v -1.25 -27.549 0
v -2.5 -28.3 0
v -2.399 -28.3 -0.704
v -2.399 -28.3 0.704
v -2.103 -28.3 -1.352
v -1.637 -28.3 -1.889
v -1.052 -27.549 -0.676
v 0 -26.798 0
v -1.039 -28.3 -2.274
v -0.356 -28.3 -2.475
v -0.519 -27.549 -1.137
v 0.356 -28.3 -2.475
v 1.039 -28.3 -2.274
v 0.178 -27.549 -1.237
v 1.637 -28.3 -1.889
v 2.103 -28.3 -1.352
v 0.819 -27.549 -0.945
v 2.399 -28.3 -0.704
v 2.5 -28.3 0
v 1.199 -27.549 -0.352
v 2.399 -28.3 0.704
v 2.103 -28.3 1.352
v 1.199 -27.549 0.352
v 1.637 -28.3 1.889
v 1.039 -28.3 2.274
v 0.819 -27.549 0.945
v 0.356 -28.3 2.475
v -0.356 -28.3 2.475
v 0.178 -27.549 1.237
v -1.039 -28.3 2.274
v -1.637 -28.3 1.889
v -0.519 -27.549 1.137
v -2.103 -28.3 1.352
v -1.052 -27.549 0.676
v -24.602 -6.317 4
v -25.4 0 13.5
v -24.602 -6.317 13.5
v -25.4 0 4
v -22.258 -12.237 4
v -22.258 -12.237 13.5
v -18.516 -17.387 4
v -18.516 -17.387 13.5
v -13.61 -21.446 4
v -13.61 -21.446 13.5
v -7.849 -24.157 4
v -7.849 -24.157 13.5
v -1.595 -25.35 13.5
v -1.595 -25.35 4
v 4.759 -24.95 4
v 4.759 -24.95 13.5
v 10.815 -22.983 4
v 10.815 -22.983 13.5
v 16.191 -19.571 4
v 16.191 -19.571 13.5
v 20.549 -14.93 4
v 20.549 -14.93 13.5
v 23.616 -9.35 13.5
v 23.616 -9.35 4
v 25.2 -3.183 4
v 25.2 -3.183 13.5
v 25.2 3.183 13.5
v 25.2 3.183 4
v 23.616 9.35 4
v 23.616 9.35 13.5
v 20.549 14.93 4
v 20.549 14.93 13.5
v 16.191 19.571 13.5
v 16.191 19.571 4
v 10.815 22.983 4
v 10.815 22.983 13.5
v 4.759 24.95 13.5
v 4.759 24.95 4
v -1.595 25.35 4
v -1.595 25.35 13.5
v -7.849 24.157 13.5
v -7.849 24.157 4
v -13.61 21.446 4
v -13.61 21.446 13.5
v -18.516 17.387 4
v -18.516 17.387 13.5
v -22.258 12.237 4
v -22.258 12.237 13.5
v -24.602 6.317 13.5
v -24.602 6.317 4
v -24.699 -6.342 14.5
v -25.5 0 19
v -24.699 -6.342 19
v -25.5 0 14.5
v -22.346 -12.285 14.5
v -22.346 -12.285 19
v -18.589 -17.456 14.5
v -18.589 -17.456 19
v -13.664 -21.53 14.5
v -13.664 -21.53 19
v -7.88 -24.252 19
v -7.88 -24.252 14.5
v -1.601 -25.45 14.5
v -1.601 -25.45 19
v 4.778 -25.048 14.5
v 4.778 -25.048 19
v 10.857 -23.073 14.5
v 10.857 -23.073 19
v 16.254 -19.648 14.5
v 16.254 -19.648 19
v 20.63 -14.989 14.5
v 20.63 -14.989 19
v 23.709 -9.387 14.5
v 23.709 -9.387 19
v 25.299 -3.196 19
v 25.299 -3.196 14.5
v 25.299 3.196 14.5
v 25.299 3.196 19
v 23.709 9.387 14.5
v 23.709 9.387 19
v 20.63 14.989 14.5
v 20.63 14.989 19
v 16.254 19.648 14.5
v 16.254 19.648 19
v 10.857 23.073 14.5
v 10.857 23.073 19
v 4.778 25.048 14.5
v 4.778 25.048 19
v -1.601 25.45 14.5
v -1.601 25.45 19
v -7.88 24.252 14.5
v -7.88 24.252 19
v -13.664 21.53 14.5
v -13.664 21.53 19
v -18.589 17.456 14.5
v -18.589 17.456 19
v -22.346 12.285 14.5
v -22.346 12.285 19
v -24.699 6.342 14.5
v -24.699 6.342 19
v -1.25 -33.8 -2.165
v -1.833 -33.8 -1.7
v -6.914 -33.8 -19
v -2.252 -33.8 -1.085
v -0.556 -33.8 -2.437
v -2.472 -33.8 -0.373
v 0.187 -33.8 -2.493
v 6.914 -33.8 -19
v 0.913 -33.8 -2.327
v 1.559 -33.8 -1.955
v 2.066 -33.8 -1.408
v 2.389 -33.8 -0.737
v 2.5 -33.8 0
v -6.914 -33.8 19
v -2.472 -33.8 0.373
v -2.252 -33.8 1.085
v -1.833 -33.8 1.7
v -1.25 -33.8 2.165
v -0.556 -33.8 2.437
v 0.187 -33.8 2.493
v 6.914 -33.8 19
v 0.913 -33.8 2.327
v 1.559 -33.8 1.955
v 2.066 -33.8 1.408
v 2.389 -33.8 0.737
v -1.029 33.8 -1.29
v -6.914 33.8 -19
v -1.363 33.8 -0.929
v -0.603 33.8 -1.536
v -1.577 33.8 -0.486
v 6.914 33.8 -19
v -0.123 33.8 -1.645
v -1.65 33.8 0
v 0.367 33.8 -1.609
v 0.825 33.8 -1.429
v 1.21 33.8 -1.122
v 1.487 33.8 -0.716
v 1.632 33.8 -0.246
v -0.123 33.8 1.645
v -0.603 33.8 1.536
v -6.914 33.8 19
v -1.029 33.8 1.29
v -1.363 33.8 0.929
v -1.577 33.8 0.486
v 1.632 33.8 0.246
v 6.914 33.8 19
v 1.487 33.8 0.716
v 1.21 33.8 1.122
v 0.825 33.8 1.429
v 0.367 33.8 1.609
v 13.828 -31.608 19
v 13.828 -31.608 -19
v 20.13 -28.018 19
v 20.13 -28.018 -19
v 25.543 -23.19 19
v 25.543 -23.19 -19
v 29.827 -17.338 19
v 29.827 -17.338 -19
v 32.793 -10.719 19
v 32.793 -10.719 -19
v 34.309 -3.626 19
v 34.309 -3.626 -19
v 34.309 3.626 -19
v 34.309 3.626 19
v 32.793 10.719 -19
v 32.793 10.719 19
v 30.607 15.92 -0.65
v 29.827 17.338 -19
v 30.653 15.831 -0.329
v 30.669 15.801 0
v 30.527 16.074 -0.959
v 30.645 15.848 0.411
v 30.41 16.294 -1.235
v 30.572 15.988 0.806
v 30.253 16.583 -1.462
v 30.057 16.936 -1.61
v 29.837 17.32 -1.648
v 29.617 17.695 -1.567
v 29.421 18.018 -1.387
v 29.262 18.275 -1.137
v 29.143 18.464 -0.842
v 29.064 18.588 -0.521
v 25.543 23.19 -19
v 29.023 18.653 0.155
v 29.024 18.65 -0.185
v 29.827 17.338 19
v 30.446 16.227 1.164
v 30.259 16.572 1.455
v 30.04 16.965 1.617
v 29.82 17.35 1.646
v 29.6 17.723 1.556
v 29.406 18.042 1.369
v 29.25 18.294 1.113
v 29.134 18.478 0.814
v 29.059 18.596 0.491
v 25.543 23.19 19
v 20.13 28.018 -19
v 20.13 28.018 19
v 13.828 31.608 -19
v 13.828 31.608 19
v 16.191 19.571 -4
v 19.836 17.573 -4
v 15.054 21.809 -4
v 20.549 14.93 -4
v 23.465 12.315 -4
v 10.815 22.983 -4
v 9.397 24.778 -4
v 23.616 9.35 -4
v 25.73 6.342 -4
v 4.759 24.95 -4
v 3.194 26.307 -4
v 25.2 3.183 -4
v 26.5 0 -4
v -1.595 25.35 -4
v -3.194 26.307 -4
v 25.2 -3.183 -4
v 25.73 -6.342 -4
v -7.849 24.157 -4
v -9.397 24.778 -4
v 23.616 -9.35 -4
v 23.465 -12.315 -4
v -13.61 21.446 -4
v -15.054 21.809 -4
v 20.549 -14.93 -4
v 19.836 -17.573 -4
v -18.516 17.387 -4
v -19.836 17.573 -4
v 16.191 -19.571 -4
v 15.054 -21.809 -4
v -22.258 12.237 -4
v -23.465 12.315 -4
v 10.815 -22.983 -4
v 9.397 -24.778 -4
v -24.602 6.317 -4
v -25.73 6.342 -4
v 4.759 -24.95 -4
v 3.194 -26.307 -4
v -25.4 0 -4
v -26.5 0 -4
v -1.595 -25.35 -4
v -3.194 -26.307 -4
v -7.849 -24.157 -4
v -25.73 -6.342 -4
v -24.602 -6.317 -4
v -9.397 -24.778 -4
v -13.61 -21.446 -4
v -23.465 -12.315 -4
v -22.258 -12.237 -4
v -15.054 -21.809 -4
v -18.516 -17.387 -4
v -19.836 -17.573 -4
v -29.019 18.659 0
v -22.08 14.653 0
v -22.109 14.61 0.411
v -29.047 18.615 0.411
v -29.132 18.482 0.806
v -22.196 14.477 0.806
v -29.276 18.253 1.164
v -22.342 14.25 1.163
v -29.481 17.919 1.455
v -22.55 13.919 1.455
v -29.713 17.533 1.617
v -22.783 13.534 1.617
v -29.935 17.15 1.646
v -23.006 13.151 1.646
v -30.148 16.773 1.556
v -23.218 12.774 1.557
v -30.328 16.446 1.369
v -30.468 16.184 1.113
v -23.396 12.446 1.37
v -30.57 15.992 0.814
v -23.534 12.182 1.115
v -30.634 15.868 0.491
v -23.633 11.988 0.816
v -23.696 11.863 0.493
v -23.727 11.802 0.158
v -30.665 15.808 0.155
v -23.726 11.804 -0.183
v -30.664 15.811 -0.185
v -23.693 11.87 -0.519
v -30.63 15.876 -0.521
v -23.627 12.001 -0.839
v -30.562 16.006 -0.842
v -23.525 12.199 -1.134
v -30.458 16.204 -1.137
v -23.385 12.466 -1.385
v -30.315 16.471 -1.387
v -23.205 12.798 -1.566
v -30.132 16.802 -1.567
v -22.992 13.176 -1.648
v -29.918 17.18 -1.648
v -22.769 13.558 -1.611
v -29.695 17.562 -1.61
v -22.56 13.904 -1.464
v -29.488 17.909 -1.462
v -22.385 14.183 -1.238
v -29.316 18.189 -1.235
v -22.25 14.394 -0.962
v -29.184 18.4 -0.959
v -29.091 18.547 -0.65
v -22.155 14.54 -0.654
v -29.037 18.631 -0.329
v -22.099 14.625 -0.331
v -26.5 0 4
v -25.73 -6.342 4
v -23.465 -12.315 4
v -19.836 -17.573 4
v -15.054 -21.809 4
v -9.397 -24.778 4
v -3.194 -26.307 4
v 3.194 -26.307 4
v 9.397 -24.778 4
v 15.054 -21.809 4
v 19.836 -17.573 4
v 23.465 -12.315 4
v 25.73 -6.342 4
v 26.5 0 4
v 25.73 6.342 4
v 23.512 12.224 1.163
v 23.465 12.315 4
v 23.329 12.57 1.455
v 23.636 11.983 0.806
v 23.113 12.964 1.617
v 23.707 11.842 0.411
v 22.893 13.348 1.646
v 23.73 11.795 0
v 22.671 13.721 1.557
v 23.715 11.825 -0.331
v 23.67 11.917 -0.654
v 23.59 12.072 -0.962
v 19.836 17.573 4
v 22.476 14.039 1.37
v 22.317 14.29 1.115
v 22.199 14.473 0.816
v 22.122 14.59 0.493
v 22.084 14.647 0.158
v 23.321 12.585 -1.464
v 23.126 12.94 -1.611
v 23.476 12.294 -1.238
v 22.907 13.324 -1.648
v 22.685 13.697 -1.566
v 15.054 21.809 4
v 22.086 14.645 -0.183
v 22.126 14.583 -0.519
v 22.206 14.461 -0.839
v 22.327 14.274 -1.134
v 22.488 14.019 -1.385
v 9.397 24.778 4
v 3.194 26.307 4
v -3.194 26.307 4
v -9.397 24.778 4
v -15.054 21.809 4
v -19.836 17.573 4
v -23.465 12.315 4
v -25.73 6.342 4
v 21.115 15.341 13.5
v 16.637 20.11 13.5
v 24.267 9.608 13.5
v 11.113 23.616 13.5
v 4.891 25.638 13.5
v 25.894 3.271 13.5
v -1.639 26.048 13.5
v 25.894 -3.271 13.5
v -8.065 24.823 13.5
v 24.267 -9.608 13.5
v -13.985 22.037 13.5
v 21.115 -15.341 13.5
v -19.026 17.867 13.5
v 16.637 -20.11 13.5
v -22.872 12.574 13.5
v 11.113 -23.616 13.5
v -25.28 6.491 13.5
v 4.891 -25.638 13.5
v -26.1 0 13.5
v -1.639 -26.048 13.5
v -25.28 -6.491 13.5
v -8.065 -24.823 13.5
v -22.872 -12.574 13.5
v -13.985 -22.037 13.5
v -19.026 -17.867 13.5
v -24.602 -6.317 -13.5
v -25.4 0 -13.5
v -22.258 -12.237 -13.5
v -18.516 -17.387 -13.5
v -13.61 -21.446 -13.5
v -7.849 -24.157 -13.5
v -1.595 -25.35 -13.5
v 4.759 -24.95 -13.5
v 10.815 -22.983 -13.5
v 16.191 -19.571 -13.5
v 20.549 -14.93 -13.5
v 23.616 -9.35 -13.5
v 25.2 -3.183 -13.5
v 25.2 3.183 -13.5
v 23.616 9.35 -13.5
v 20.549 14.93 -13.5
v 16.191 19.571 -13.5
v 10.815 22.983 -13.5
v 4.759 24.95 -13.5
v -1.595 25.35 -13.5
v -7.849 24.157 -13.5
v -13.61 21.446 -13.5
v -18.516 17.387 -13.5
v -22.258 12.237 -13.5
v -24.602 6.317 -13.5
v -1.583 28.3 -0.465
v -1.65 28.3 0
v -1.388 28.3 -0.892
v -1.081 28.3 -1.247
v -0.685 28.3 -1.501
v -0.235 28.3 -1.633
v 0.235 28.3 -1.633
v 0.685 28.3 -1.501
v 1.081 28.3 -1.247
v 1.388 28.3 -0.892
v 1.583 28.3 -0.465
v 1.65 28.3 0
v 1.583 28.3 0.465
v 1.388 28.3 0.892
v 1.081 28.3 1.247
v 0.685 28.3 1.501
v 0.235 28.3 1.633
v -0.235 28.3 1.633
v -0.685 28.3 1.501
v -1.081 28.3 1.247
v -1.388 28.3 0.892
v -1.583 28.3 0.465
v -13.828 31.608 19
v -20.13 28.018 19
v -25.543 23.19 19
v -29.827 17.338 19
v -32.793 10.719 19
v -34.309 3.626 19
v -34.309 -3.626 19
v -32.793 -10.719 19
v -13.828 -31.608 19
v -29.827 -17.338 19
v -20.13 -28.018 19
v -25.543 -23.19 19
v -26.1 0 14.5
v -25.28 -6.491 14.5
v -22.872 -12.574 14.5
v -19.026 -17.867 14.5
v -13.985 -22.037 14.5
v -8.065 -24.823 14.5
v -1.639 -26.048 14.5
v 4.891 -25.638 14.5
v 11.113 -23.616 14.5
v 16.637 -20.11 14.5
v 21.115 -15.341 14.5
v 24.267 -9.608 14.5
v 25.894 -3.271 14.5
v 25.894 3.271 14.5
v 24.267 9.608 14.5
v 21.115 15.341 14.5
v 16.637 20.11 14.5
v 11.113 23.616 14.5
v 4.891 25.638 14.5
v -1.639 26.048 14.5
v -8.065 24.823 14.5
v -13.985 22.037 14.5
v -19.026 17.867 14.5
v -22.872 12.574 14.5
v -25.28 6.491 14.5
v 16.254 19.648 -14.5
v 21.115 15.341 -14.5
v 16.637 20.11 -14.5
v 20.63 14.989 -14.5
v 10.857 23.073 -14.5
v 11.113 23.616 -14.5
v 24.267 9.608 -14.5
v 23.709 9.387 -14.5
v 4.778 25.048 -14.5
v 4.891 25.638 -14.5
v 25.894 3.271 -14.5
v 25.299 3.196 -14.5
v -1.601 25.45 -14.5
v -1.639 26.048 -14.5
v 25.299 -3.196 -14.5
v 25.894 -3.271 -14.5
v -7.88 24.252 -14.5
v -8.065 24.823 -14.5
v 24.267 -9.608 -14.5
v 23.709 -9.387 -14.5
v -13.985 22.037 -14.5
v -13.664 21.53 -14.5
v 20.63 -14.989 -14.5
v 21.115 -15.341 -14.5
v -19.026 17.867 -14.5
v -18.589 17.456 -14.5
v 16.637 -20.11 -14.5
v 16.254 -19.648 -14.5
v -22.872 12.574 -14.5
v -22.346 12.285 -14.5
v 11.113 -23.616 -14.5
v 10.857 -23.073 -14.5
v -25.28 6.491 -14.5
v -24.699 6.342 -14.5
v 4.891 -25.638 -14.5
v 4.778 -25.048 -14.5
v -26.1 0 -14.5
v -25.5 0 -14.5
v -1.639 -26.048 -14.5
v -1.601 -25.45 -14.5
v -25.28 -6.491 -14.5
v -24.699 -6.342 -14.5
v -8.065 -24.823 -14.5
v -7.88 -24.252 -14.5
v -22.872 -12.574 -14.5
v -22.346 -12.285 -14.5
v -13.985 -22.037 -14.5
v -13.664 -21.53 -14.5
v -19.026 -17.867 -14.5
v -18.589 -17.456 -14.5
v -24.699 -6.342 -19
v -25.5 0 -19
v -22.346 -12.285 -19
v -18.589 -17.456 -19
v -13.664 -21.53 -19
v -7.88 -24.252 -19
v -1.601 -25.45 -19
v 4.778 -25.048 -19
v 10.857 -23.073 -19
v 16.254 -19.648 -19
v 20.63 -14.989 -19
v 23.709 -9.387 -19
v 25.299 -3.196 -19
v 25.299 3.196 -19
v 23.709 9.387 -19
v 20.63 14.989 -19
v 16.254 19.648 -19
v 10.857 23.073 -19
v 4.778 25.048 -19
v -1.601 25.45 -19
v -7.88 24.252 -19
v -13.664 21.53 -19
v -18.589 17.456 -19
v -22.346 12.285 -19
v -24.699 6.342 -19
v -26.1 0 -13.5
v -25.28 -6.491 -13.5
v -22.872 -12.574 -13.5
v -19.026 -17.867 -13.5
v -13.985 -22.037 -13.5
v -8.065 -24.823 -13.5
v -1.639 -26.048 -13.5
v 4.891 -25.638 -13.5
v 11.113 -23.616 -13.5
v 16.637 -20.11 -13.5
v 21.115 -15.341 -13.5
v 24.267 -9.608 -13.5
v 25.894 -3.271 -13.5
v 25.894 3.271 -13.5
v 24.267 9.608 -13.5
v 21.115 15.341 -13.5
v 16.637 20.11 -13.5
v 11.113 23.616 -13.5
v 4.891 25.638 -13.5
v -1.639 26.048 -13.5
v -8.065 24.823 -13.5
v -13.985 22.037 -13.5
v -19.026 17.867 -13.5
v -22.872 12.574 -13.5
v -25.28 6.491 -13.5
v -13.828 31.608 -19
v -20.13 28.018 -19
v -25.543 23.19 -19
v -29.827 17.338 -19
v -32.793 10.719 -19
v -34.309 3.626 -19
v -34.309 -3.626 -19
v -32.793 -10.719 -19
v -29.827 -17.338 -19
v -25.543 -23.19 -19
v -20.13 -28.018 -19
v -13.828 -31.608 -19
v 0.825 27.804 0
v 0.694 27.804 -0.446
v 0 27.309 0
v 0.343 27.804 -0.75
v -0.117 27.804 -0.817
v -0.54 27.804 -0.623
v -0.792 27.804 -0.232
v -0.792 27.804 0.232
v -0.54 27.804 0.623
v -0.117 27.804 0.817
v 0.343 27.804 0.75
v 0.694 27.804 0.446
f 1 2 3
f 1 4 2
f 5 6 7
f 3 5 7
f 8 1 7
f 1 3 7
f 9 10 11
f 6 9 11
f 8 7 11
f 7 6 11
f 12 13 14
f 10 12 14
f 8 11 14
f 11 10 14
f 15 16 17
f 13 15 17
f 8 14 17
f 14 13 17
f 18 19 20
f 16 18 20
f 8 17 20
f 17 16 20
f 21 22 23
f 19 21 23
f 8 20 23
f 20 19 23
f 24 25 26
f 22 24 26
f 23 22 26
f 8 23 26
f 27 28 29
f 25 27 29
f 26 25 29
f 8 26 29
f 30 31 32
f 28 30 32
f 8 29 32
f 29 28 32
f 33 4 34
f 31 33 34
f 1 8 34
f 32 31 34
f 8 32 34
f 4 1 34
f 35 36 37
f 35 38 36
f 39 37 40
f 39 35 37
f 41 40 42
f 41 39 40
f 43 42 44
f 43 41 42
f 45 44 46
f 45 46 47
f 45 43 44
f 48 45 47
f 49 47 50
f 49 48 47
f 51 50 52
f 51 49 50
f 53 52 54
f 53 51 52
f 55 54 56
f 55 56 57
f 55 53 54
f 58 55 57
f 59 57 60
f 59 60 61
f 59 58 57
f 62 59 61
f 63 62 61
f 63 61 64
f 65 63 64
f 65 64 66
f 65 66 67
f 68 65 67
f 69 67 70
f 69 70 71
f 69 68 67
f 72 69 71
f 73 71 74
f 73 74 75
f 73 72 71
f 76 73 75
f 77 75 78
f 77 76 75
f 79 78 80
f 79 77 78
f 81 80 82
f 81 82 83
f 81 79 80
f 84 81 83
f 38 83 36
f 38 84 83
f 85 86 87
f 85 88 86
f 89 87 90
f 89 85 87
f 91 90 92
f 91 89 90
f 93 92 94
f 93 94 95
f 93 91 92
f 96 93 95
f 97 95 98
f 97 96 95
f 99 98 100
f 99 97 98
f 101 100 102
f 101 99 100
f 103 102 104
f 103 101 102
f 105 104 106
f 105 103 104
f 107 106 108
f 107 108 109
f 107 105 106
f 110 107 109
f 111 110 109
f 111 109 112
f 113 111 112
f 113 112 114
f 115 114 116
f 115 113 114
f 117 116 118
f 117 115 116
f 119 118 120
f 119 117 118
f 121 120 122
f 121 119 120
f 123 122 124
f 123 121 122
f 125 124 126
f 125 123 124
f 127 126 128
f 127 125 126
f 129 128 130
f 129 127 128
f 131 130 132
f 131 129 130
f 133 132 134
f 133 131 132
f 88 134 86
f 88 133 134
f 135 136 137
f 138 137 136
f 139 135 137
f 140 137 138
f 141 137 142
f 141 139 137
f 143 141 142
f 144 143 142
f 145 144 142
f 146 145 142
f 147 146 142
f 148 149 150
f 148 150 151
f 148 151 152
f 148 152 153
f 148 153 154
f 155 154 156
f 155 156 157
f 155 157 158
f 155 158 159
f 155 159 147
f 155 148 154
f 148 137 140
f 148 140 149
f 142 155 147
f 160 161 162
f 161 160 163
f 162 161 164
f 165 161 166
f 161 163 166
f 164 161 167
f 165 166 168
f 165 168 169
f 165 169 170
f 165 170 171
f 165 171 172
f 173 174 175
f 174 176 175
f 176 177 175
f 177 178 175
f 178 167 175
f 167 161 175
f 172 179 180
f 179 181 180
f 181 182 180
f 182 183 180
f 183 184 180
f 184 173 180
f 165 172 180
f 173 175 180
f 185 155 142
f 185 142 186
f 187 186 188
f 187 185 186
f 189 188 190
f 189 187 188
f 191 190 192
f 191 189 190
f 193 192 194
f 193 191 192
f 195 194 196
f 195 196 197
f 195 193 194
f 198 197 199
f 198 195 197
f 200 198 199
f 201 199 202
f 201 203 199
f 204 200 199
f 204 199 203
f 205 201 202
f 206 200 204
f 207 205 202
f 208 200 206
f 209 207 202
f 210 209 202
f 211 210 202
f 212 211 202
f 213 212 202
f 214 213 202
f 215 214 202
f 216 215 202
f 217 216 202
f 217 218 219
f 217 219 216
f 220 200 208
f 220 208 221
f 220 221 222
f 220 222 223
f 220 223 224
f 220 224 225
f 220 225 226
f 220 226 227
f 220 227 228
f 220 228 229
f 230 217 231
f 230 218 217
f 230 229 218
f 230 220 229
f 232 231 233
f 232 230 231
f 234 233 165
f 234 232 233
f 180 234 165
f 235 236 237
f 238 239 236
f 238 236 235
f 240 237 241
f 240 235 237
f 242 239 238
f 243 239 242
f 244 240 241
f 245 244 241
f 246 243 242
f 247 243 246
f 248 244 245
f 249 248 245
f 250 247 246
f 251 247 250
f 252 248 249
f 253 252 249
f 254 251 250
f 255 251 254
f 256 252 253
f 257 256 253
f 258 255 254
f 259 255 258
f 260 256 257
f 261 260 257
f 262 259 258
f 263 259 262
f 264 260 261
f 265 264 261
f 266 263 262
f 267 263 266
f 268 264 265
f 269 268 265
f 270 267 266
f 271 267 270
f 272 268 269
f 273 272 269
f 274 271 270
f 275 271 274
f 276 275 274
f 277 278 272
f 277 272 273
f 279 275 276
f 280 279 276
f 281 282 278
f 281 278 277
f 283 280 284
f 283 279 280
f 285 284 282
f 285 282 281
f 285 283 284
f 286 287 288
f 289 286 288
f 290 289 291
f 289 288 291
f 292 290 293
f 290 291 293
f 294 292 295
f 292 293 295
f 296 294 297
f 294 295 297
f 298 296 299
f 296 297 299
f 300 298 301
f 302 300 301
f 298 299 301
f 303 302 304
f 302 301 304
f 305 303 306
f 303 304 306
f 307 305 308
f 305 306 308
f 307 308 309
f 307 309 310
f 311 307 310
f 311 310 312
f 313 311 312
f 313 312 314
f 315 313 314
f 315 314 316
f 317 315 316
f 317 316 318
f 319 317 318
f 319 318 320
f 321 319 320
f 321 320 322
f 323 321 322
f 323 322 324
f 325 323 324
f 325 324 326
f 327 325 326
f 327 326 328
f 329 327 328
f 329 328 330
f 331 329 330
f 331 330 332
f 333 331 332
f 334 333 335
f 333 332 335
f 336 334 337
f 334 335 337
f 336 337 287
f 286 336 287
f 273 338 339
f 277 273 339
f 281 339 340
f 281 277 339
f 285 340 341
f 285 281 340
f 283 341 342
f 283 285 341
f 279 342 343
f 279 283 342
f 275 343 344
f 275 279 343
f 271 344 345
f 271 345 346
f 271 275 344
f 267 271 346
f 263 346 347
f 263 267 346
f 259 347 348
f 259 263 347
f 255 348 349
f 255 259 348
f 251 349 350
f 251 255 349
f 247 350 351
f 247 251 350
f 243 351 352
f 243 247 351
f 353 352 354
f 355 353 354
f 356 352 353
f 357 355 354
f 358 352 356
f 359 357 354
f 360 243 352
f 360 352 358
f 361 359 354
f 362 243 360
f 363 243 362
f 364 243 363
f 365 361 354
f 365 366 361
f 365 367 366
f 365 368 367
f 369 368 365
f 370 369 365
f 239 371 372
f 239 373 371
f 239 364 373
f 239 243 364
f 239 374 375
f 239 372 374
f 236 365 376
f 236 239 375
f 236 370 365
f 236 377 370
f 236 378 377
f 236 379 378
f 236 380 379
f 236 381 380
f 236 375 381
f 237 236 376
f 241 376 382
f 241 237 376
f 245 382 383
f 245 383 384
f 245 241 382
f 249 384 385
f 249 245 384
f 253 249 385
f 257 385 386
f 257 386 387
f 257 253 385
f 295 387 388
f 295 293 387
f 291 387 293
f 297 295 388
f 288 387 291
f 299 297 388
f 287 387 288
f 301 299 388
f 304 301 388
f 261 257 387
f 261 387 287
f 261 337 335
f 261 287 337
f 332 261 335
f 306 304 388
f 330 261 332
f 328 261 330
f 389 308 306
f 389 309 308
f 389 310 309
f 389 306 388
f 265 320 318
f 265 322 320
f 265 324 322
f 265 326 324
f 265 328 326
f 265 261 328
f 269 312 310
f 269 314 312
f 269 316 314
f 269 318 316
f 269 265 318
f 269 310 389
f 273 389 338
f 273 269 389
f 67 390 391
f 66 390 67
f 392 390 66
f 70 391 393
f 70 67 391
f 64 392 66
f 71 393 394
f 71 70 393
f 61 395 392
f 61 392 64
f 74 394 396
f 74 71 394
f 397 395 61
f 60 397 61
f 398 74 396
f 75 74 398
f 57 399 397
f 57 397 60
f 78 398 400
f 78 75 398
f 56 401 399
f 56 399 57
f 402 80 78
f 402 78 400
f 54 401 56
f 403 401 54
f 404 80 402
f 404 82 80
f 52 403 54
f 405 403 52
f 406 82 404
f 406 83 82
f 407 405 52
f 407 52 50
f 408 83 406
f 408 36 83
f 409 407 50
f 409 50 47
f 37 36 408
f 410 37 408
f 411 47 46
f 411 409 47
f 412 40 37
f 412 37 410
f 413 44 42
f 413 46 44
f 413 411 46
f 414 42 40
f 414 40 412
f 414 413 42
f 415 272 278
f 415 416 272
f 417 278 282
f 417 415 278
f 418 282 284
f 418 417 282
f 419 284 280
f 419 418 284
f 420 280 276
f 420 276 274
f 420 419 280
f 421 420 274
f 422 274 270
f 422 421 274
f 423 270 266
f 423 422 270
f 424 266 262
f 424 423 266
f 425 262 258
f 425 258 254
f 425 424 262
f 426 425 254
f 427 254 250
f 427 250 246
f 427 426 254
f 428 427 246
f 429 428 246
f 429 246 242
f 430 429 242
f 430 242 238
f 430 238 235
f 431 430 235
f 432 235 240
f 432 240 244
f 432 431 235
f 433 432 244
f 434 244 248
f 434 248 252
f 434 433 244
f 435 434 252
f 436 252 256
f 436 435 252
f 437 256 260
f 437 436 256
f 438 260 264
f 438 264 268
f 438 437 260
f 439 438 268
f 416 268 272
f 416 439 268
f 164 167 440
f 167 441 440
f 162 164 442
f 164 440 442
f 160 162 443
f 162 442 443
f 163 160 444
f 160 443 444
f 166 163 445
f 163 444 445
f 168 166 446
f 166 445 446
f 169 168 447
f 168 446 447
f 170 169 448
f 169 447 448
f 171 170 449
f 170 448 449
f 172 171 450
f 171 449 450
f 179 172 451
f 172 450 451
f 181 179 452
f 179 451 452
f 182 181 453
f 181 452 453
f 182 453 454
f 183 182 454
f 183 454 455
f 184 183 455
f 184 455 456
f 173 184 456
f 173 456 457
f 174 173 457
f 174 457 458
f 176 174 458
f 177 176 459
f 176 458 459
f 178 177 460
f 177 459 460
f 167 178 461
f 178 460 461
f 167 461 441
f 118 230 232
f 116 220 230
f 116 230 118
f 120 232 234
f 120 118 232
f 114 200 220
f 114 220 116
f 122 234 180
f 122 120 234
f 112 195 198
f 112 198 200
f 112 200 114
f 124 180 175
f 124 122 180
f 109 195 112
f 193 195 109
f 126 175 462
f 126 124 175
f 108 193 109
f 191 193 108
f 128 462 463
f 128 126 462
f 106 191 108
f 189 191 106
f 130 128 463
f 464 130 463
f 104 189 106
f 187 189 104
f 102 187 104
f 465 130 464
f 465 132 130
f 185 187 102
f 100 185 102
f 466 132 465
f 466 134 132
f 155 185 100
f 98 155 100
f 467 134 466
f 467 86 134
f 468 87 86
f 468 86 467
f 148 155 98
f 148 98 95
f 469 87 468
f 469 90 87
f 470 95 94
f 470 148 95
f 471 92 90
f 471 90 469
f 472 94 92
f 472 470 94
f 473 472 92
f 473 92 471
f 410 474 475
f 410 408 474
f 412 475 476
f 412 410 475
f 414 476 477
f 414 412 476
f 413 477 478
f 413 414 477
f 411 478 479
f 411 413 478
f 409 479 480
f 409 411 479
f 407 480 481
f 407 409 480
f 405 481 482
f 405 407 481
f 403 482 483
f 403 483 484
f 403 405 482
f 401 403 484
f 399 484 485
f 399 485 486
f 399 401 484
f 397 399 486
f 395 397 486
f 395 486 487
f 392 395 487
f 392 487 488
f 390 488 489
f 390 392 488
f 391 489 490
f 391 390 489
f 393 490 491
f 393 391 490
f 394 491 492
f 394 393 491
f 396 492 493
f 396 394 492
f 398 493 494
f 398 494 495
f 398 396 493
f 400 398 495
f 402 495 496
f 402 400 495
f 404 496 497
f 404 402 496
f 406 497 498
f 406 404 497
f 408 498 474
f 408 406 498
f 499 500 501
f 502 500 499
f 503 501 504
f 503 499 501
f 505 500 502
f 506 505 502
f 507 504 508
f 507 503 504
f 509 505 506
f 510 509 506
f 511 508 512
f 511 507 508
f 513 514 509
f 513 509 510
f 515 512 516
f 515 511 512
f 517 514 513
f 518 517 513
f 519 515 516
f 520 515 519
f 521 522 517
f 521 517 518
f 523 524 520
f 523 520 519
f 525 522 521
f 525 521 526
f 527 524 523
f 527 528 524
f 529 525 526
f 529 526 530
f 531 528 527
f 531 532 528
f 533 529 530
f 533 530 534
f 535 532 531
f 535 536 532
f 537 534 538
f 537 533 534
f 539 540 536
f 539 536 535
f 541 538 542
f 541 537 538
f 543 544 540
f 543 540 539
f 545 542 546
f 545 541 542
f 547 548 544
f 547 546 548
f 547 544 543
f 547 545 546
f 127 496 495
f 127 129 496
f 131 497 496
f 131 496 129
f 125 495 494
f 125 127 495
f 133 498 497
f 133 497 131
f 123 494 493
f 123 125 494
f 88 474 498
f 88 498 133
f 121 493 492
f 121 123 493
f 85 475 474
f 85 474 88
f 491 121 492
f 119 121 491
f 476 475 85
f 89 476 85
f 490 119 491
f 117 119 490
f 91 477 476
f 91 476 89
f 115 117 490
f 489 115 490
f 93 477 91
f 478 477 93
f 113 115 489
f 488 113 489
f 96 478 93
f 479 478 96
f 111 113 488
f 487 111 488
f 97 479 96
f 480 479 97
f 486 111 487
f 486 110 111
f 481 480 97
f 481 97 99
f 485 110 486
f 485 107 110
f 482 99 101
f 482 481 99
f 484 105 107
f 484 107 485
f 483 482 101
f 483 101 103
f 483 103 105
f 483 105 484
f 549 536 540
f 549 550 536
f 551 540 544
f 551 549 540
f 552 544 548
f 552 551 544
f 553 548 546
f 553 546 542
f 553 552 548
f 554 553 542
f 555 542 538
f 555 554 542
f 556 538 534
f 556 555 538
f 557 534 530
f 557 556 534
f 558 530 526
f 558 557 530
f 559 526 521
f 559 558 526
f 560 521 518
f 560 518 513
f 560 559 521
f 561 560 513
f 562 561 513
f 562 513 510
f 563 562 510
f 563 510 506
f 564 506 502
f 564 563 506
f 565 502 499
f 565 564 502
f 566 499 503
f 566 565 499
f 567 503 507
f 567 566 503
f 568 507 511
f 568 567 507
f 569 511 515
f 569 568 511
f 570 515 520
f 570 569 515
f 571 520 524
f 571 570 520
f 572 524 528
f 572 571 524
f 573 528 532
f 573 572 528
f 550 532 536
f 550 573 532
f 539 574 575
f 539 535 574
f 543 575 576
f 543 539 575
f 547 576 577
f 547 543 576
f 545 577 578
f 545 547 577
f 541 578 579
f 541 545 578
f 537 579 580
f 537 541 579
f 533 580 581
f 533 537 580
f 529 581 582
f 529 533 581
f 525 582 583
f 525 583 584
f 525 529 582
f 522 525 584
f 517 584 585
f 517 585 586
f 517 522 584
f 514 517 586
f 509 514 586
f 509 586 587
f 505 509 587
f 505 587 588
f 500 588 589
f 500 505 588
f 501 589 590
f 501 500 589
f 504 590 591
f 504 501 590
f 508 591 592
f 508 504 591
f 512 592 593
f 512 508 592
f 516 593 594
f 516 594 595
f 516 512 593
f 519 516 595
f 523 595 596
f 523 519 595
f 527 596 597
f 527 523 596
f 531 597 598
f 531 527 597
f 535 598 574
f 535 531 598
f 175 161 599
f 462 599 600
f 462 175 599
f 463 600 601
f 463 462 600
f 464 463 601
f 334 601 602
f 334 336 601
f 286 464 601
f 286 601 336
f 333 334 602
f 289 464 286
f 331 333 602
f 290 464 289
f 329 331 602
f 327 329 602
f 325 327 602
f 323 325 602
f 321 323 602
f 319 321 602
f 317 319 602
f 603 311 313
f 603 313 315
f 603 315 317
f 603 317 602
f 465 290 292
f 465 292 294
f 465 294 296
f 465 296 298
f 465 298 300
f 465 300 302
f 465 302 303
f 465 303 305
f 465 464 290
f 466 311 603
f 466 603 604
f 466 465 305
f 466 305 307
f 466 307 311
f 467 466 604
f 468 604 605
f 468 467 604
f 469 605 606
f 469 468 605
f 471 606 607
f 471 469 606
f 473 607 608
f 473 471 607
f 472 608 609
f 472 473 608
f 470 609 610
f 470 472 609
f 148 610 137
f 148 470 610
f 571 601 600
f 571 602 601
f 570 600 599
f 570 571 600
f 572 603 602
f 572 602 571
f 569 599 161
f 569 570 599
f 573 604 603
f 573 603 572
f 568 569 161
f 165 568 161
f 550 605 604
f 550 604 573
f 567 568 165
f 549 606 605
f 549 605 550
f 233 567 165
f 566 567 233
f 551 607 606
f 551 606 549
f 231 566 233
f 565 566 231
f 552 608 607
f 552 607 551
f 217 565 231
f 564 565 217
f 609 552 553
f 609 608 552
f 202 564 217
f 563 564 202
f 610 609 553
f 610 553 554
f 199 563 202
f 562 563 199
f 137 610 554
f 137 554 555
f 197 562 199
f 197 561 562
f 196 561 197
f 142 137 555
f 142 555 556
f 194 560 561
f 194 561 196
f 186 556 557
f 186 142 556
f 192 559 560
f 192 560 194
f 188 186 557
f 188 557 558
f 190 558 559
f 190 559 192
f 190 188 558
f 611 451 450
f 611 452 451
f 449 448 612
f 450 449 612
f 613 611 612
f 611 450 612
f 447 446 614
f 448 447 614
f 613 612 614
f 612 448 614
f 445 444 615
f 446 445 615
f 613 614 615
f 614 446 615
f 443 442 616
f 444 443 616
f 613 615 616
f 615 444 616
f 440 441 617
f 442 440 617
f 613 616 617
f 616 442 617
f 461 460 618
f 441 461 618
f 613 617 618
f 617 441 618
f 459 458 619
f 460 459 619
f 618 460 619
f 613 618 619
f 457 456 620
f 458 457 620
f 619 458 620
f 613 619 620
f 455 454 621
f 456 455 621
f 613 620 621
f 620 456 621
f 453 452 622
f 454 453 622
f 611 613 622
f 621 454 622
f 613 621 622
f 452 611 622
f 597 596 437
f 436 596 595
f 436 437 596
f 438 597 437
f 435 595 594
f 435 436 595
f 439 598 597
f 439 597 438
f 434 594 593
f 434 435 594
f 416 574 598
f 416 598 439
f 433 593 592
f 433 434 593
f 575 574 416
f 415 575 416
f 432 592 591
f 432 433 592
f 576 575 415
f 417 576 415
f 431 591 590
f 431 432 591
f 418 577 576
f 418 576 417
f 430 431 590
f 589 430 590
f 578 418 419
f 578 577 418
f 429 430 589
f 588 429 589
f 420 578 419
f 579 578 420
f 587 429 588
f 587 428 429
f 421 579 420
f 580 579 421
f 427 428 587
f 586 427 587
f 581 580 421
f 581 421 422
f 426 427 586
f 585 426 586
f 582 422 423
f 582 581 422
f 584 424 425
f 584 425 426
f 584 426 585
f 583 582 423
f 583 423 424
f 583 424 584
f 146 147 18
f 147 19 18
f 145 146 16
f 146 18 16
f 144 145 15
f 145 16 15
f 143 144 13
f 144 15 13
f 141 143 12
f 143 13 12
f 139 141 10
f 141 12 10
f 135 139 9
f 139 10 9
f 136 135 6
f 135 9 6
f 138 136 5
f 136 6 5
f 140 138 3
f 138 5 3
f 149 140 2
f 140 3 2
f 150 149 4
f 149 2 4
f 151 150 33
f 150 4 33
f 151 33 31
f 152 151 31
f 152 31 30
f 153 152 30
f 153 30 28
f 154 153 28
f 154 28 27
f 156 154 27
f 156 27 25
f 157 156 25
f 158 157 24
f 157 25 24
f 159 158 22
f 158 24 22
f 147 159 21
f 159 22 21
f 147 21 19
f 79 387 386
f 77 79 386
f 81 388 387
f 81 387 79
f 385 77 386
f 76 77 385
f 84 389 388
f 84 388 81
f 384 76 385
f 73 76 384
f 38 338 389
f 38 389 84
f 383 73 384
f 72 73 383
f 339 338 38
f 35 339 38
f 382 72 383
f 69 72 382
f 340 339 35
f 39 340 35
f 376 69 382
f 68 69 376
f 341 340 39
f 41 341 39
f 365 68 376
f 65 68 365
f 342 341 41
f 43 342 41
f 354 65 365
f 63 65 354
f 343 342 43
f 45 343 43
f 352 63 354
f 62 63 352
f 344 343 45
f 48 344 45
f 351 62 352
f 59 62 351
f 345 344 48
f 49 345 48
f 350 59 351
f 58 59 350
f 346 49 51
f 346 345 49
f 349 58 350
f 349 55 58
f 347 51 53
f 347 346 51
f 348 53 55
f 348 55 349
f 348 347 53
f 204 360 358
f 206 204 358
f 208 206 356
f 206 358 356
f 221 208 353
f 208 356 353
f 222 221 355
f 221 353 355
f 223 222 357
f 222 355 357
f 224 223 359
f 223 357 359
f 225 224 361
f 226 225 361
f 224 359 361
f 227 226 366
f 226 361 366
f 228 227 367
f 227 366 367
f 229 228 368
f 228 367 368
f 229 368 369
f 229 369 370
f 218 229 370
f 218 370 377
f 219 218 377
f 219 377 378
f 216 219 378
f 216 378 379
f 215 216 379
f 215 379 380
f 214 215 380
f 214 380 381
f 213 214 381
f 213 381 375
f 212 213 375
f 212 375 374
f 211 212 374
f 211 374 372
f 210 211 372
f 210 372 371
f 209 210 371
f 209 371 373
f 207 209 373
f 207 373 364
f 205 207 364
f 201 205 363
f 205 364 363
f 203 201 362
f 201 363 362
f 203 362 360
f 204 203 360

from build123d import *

# Parameters (mm, degrees)
SKETCH_2_W                       = 64.02174429
SKETCH_2_H                       = 9.248919907
CUT_EXTRUDE_1_DEPTH              = 49
HOLE_WIZARD_M4_2_D               = 3.3
HOLE_WIZARD_M4_2_DEPTH           = 5.5
HOLE_WIZARD_M4_2_TIP             = 0.991420021
HOLE_WIZARD_M6_2_D               = 5
HOLE_WIZARD_M6_2_DEPTH           = 5.5
HOLE_WIZARD_M6_2_TIP             = 1.502151548
HOLE_WIZARD_M4_3_D               = 3.3
HOLE_WIZARD_M4_3_DEPTH           = 10.1
HOLE_WIZARD_M4_3_TIP             = 0.991420021
HOLE_WIZARD_M4_3_ON_FACE_2_D     = 3.3
HOLE_WIZARD_M4_3_ON_FACE_2_DEPTH = 10.1
HOLE_WIZARD_M4_3_ON_FACE_2_TIP   = 0.991420021


with BuildPart() as part:
    # 草图1 → 旋转1 (revolve)
    with BuildSketch(Plane(origin=(0, 0, 0), x_dir=(1, 0, 0), z_dir=(0, 1, 0)), mode=Mode.PRIVATE) as revolve_1_sk:
        Polygon((34.5, 19), (34.5, -19), (25.5, -19), (25.5, -14.5), (26.1, -14.5), (26.1, -13.5), (25.4, -13.5), (25.4, -4), (26.5, -4), (26.5, 4), (25.4, 4), (25.4, 13.5), (26.1, 13.5), (26.1, 14.5), (25.5, 14.5), (25.5, 19), align=None)
    revolve(revolve_1_sk.sketch.rotate(Axis((0, 0, -31.9390681), (0, 0, 1)), 180), axis=Axis((0, 0, -31.9390681), (0, 0, 1)))  # turned: the seam where the file's is

    # 草图2 → 切除-拉伸1 (cut)
    with BuildSketch(Plane.XY.offset(19)):
        with Locations((-1.141100508, 38.424459954)):
            Rectangle(SKETCH_2_W, SKETCH_2_H)
        with Locations((-1.141100508, -38.424459954)):
            Rectangle(SKETCH_2_W, SKETCH_2_H)
    extrude(amount=-CUT_EXTRUDE_1_DEPTH, mode=Mode.SUBTRACT)

    # M4 螺纹孔2
    with Locations(Plane(origin=(0, 33.8, 0), x_dir=(1, 0, 0), z_dir=(0, 1, 0))):
        with Locations((0, 0)):
            Hole(HOLE_WIZARD_M4_2_D / 2, depth=HOLE_WIZARD_M4_2_DEPTH)
            with Locations((0, 0, -(HOLE_WIZARD_M4_2_DEPTH + HOLE_WIZARD_M4_2_TIP / 2))):  # 118° drill point
                Cone(0, HOLE_WIZARD_M4_2_D / 2, HOLE_WIZARD_M4_2_TIP, mode=Mode.SUBTRACT)

    # M6 螺纹孔2
    with Locations(Plane(origin=(0, -33.8, 0), x_dir=(-1, 0, 0), z_dir=(0, -1, 0))):
        with Locations((0, 0)):
            Hole(HOLE_WIZARD_M6_2_D / 2, depth=HOLE_WIZARD_M6_2_DEPTH)
            with Locations((0, 0, -(HOLE_WIZARD_M6_2_DEPTH + HOLE_WIZARD_M6_2_TIP / 2))):  # 118° drill point
                Cone(0, HOLE_WIZARD_M6_2_D / 2, HOLE_WIZARD_M6_2_TIP, mode=Mode.SUBTRACT)

    # M4 螺纹孔3
    with Locations(Plane(origin=(29.877876431, 17.25, 0), x_dir=(-0.5, 0.866025404, 0), z_dir=(0.866025404, 0.5, 0))):
        with Locations((0, 0)):
            Hole(HOLE_WIZARD_M4_3_D / 2, depth=HOLE_WIZARD_M4_3_DEPTH)
            with Locations((0, 0, -(HOLE_WIZARD_M4_3_DEPTH + HOLE_WIZARD_M4_3_TIP / 2))):  # 118° drill point
                Cone(0, HOLE_WIZARD_M4_3_D / 2, HOLE_WIZARD_M4_3_TIP, mode=Mode.SUBTRACT)

    # M4 螺纹孔3 on face 2
    with Locations(Plane(origin=(-29.877876431, 17.25, 0), x_dir=(-0.500000175, -0.866025303, 0), z_dir=(-0.866025303, 0.500000175, 0))):
        with Locations((0, 0)):
            Hole(HOLE_WIZARD_M4_3_ON_FACE_2_D / 2, depth=HOLE_WIZARD_M4_3_ON_FACE_2_DEPTH)
            with Locations((0, 0, -(HOLE_WIZARD_M4_3_ON_FACE_2_DEPTH + HOLE_WIZARD_M4_3_ON_FACE_2_TIP / 2))):  # 118° drill point
                Cone(0, HOLE_WIZARD_M4_3_ON_FACE_2_D / 2, HOLE_WIZARD_M4_3_ON_FACE_2_TIP, mode=Mode.SUBTRACT)


solid = part.part
